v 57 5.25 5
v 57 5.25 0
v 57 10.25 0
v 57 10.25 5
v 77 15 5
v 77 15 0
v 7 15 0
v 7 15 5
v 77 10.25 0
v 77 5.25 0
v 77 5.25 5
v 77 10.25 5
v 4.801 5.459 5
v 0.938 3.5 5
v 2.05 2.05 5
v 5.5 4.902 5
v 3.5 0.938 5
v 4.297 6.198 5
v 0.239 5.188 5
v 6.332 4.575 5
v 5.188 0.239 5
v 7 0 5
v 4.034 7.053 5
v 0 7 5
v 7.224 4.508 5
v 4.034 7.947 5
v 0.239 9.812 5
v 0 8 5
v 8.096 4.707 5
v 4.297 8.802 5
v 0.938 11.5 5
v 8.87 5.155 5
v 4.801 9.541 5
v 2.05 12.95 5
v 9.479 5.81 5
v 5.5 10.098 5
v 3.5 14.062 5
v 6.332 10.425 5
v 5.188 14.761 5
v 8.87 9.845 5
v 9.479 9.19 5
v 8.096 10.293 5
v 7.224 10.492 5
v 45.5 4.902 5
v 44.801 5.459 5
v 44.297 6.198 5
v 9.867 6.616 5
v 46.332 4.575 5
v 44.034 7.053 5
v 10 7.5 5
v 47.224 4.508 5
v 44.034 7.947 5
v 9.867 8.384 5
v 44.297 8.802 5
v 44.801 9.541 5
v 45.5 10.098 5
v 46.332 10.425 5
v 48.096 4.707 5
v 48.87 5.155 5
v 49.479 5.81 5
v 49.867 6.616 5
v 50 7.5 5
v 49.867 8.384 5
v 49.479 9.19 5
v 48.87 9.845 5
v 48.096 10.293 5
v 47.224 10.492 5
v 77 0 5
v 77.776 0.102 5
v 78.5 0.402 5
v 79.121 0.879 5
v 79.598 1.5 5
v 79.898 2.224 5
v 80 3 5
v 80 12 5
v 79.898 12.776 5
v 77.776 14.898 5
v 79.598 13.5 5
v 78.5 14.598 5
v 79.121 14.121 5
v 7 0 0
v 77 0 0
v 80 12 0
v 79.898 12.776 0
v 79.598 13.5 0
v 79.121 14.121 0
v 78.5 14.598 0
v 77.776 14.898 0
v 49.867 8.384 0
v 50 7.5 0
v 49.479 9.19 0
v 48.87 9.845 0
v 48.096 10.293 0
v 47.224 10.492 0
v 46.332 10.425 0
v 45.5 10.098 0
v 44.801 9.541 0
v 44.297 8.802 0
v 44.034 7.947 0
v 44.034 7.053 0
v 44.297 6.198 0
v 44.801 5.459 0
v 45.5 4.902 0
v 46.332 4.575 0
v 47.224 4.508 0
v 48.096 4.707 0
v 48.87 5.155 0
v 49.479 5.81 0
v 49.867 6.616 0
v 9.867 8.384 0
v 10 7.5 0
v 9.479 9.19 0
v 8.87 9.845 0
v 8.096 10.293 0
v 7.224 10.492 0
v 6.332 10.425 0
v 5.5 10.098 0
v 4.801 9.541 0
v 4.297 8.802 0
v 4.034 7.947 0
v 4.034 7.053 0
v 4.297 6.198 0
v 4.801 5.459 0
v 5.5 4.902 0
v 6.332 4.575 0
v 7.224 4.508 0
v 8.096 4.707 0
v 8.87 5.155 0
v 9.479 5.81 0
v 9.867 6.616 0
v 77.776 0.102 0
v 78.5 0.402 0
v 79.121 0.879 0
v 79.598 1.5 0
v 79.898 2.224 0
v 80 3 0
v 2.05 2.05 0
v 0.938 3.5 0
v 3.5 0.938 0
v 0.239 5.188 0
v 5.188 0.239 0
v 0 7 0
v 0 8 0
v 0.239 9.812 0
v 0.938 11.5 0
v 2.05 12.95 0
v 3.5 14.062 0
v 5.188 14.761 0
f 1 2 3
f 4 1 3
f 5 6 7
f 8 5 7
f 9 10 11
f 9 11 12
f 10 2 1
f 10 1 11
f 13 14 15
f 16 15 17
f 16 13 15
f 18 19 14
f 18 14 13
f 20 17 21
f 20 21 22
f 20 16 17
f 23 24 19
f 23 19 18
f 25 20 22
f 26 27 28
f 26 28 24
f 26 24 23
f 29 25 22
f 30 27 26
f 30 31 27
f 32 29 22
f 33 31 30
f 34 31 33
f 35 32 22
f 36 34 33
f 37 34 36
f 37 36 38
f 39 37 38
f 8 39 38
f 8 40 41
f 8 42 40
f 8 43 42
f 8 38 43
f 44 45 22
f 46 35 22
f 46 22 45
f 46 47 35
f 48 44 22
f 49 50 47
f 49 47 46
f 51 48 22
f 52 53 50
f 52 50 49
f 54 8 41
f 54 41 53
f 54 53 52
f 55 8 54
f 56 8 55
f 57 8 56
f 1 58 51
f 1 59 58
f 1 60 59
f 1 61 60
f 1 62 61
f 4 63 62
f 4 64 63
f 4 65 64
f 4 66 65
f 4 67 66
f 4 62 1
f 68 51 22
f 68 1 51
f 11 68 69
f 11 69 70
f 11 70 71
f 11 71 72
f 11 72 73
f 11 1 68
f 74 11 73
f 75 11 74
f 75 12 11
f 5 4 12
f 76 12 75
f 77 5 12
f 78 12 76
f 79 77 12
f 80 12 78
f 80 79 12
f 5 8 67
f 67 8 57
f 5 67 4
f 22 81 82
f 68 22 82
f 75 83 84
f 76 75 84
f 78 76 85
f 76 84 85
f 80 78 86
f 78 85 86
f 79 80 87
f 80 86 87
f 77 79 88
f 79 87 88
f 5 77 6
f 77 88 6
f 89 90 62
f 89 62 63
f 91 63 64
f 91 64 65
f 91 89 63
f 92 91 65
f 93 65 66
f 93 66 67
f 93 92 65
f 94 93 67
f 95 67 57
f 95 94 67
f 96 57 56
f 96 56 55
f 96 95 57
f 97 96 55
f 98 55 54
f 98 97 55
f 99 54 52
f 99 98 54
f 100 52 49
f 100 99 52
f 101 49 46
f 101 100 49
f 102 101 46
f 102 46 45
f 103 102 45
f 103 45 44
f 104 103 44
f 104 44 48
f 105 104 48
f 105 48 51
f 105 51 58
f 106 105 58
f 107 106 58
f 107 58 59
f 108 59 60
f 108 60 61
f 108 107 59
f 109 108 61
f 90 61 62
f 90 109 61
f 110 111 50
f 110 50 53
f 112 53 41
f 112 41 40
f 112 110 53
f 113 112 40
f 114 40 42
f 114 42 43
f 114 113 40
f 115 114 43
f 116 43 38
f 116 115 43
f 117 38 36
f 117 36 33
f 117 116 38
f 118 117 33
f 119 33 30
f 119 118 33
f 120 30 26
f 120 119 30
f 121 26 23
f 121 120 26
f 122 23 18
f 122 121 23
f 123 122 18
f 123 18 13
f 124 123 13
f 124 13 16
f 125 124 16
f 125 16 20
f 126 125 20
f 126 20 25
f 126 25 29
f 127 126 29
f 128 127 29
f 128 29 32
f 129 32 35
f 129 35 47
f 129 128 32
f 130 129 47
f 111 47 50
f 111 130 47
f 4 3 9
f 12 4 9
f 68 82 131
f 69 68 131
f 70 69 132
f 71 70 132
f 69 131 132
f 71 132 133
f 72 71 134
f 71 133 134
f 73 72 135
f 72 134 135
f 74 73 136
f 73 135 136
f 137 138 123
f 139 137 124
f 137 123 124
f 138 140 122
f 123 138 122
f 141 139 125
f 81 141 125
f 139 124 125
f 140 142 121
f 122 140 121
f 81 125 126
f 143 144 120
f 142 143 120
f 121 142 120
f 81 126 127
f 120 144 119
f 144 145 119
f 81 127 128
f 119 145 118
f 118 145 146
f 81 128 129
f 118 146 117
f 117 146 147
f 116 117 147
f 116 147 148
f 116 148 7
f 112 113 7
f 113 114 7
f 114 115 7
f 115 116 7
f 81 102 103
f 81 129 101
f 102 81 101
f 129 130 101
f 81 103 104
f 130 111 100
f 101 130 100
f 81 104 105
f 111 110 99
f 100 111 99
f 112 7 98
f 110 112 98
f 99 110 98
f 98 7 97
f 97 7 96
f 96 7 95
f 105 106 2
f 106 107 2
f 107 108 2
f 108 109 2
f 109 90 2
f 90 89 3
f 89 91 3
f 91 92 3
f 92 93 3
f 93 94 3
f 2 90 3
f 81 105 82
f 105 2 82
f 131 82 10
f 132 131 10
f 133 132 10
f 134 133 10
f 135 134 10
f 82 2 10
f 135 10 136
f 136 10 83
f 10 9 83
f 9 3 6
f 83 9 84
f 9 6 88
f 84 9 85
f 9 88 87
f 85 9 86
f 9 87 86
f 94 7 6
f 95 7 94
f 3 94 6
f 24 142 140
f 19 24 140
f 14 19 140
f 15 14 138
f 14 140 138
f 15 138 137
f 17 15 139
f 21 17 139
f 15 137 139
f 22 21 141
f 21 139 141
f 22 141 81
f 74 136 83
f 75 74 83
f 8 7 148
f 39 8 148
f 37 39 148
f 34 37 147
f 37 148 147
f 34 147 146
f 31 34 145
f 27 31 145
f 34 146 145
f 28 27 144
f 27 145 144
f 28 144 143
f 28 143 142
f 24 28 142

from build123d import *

# Parameters (mm, degrees)
SKETCH1_R           = 3
SKETCH1_W           = 20
SKETCH1_H           = 5
BOSS_EXTRUDE1_DEPTH = 5


with BuildPart() as part:
    # Sketch1 → Boss-Extrude1 (new body)
    with BuildSketch(Plane.XY):
        with BuildLine():
            Line((7, 0), (77, 0))
            ThreePointArc((77, 0), (79.121320344, 0.878679656), (80, 3))
            Line((80, 3), (80, 12))
            ThreePointArc((80, 12), (79.121320344, 14.121320344), (77, 15))
            Line((77, 15), (7, 15))
            ThreePointArc((7, 15), (2.050252532, 12.949747468), (0, 8))
            Line((0, 8), (0, 7))
            ThreePointArc((0, 7), (2.050252532, 2.050252532), (7, 0))
        make_face()
        with Locations((7, 7.5)):
            Circle(SKETCH1_R, mode=Mode.SUBTRACT)
        with Locations((47, 7.5)):
            Circle(SKETCH1_R, mode=Mode.SUBTRACT)
        with Locations((67, 7.75)):
            Rectangle(SKETCH1_W, SKETCH1_H, mode=Mode.SUBTRACT)
    extrude(amount=BOSS_EXTRUDE1_DEPTH)


solid = part.part
